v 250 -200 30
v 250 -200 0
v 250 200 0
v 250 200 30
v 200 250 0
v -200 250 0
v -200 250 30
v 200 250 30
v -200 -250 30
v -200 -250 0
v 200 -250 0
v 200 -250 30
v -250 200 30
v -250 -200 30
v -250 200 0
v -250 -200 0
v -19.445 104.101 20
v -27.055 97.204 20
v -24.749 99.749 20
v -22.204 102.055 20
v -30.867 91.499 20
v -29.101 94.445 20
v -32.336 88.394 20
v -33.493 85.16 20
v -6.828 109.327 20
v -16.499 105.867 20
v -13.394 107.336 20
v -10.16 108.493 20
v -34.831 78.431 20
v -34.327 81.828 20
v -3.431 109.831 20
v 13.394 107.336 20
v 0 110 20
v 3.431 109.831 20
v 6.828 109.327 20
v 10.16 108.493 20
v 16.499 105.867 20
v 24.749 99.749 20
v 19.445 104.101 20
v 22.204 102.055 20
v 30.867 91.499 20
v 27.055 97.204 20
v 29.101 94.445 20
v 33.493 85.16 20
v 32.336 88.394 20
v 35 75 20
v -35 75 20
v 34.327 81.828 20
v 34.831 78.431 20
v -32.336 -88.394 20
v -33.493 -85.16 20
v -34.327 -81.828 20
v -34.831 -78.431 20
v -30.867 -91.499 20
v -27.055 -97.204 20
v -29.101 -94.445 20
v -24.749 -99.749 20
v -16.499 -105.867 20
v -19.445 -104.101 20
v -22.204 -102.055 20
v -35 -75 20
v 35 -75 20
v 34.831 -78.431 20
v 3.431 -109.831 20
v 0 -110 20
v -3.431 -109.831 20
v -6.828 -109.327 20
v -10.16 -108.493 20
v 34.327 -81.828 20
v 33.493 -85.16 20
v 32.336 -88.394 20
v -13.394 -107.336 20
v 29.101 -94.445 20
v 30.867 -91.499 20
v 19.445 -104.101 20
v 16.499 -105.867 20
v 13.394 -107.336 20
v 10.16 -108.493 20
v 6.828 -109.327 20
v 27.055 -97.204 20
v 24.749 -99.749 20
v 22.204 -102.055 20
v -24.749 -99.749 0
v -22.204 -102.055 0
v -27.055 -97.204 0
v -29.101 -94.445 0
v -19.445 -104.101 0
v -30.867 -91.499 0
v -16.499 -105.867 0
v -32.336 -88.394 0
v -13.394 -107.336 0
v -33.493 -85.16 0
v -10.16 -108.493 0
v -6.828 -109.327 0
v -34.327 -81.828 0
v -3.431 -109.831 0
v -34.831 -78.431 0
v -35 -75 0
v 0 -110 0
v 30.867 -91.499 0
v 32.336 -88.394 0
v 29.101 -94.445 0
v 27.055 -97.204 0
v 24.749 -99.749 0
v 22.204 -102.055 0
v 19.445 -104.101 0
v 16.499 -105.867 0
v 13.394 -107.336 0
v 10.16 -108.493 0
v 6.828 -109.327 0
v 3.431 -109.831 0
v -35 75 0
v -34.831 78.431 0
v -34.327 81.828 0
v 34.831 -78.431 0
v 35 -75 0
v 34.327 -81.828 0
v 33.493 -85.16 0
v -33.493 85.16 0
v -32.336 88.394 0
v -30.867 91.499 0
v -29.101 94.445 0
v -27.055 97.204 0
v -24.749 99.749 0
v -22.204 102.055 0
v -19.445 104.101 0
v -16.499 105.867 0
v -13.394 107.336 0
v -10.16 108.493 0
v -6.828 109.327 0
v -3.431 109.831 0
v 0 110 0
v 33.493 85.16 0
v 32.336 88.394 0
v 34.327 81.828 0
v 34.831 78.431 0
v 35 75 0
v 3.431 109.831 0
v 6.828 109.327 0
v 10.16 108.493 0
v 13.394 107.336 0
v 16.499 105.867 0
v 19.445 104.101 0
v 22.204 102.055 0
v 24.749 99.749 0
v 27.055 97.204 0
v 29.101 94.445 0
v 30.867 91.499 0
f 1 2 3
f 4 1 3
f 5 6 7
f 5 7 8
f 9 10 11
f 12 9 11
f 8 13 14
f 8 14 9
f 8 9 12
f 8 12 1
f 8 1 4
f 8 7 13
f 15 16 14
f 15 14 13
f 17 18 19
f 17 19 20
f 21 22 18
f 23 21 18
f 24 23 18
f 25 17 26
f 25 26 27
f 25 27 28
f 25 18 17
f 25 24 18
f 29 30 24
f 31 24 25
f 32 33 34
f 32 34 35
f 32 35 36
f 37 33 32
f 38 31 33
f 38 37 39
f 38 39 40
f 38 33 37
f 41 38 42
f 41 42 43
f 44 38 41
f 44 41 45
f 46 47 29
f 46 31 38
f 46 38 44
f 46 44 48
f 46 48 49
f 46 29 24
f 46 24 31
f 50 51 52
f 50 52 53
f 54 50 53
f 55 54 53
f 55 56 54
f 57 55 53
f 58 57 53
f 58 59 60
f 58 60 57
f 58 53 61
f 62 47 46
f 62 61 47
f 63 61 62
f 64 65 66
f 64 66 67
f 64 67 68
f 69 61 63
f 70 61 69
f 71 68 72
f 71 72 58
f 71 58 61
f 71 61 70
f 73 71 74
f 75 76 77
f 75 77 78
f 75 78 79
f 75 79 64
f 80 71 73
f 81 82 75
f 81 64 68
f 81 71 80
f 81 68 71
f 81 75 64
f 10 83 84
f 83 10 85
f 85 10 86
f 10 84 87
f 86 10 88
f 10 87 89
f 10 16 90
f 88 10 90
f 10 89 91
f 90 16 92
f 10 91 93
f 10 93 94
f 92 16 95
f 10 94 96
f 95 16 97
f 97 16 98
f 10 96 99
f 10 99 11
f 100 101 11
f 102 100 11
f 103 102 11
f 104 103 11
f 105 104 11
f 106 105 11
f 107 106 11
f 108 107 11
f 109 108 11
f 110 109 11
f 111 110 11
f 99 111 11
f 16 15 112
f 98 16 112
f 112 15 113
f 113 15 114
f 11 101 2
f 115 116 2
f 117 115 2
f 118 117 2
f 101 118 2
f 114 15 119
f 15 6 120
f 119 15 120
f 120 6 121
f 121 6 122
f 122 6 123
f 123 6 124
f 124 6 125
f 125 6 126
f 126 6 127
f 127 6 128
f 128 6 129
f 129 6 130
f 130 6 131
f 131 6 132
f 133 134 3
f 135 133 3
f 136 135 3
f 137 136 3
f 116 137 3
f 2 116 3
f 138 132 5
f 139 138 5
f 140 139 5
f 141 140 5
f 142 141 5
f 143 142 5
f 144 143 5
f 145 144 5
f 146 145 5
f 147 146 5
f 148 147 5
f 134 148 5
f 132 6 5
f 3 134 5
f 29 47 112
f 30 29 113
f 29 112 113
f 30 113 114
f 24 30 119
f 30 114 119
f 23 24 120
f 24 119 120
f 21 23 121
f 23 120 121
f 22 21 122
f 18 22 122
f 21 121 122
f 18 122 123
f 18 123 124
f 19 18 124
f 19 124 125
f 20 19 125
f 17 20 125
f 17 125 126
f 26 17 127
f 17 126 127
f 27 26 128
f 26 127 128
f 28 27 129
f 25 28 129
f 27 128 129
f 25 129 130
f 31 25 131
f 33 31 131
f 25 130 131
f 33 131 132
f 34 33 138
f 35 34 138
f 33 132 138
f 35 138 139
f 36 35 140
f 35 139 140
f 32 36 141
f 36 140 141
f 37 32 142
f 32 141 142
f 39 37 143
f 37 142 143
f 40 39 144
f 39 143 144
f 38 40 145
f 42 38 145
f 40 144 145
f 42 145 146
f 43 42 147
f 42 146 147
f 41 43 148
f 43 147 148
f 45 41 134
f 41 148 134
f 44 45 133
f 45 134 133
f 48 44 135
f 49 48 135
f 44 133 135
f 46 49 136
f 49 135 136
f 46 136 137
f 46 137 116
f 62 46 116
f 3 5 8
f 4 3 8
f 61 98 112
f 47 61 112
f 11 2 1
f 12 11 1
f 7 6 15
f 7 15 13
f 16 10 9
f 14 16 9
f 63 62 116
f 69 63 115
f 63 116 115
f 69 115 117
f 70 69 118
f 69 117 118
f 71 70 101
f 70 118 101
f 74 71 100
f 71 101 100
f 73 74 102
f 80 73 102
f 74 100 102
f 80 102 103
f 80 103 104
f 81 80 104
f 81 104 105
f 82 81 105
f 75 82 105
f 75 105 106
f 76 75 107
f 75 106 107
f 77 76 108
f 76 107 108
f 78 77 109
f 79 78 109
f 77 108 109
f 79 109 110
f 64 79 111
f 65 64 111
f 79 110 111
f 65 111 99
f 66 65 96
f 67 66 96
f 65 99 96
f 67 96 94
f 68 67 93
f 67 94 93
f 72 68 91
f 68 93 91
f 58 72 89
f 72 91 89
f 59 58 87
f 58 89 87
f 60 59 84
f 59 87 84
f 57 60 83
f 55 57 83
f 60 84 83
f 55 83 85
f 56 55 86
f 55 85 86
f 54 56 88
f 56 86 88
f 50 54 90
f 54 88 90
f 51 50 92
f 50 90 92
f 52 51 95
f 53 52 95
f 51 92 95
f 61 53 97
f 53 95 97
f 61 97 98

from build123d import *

# Parameters (mm, degrees)
F0_W     = 500
F0_H     = 500
F1_DEPTH = 30
F2_SIZE  = 50
F4_DEPTH = 20


with BuildPart() as f1:
    # F0 (on Top) → F1 (new body)
    with BuildSketch(Plane.XY):
        Rectangle(F0_W, F0_H)
    extrude(amount=F1_DEPTH)

    # F2
    f2_edges = [f1.edges().sort_by_distance(p)[0] for p in [
        (250, -250, 15),
        (250, 250, 15),
        (-250, -250, 15),
        (-250, 250, 15),
    ]]
    chamfer(f2_edges, length=F2_SIZE)

    # F3 (on face) → F4 (cut)
    with BuildSketch(Plane(origin=(0, 0, 0), x_dir=(1, 0, 0), z_dir=(0, 0, -1))):
        with BuildLine():
            ThreePointArc((-35, -75), (0, -110), (35, -75))
            Line((35, -75), (35, 75))
            ThreePointArc((35, 75), (0, 110), (-35, 75))
            Line((-35, 75), (-35, -75))
        make_face()
    extrude(amount=-F4_DEPTH, mode=Mode.SUBTRACT)


solid = f1.part
